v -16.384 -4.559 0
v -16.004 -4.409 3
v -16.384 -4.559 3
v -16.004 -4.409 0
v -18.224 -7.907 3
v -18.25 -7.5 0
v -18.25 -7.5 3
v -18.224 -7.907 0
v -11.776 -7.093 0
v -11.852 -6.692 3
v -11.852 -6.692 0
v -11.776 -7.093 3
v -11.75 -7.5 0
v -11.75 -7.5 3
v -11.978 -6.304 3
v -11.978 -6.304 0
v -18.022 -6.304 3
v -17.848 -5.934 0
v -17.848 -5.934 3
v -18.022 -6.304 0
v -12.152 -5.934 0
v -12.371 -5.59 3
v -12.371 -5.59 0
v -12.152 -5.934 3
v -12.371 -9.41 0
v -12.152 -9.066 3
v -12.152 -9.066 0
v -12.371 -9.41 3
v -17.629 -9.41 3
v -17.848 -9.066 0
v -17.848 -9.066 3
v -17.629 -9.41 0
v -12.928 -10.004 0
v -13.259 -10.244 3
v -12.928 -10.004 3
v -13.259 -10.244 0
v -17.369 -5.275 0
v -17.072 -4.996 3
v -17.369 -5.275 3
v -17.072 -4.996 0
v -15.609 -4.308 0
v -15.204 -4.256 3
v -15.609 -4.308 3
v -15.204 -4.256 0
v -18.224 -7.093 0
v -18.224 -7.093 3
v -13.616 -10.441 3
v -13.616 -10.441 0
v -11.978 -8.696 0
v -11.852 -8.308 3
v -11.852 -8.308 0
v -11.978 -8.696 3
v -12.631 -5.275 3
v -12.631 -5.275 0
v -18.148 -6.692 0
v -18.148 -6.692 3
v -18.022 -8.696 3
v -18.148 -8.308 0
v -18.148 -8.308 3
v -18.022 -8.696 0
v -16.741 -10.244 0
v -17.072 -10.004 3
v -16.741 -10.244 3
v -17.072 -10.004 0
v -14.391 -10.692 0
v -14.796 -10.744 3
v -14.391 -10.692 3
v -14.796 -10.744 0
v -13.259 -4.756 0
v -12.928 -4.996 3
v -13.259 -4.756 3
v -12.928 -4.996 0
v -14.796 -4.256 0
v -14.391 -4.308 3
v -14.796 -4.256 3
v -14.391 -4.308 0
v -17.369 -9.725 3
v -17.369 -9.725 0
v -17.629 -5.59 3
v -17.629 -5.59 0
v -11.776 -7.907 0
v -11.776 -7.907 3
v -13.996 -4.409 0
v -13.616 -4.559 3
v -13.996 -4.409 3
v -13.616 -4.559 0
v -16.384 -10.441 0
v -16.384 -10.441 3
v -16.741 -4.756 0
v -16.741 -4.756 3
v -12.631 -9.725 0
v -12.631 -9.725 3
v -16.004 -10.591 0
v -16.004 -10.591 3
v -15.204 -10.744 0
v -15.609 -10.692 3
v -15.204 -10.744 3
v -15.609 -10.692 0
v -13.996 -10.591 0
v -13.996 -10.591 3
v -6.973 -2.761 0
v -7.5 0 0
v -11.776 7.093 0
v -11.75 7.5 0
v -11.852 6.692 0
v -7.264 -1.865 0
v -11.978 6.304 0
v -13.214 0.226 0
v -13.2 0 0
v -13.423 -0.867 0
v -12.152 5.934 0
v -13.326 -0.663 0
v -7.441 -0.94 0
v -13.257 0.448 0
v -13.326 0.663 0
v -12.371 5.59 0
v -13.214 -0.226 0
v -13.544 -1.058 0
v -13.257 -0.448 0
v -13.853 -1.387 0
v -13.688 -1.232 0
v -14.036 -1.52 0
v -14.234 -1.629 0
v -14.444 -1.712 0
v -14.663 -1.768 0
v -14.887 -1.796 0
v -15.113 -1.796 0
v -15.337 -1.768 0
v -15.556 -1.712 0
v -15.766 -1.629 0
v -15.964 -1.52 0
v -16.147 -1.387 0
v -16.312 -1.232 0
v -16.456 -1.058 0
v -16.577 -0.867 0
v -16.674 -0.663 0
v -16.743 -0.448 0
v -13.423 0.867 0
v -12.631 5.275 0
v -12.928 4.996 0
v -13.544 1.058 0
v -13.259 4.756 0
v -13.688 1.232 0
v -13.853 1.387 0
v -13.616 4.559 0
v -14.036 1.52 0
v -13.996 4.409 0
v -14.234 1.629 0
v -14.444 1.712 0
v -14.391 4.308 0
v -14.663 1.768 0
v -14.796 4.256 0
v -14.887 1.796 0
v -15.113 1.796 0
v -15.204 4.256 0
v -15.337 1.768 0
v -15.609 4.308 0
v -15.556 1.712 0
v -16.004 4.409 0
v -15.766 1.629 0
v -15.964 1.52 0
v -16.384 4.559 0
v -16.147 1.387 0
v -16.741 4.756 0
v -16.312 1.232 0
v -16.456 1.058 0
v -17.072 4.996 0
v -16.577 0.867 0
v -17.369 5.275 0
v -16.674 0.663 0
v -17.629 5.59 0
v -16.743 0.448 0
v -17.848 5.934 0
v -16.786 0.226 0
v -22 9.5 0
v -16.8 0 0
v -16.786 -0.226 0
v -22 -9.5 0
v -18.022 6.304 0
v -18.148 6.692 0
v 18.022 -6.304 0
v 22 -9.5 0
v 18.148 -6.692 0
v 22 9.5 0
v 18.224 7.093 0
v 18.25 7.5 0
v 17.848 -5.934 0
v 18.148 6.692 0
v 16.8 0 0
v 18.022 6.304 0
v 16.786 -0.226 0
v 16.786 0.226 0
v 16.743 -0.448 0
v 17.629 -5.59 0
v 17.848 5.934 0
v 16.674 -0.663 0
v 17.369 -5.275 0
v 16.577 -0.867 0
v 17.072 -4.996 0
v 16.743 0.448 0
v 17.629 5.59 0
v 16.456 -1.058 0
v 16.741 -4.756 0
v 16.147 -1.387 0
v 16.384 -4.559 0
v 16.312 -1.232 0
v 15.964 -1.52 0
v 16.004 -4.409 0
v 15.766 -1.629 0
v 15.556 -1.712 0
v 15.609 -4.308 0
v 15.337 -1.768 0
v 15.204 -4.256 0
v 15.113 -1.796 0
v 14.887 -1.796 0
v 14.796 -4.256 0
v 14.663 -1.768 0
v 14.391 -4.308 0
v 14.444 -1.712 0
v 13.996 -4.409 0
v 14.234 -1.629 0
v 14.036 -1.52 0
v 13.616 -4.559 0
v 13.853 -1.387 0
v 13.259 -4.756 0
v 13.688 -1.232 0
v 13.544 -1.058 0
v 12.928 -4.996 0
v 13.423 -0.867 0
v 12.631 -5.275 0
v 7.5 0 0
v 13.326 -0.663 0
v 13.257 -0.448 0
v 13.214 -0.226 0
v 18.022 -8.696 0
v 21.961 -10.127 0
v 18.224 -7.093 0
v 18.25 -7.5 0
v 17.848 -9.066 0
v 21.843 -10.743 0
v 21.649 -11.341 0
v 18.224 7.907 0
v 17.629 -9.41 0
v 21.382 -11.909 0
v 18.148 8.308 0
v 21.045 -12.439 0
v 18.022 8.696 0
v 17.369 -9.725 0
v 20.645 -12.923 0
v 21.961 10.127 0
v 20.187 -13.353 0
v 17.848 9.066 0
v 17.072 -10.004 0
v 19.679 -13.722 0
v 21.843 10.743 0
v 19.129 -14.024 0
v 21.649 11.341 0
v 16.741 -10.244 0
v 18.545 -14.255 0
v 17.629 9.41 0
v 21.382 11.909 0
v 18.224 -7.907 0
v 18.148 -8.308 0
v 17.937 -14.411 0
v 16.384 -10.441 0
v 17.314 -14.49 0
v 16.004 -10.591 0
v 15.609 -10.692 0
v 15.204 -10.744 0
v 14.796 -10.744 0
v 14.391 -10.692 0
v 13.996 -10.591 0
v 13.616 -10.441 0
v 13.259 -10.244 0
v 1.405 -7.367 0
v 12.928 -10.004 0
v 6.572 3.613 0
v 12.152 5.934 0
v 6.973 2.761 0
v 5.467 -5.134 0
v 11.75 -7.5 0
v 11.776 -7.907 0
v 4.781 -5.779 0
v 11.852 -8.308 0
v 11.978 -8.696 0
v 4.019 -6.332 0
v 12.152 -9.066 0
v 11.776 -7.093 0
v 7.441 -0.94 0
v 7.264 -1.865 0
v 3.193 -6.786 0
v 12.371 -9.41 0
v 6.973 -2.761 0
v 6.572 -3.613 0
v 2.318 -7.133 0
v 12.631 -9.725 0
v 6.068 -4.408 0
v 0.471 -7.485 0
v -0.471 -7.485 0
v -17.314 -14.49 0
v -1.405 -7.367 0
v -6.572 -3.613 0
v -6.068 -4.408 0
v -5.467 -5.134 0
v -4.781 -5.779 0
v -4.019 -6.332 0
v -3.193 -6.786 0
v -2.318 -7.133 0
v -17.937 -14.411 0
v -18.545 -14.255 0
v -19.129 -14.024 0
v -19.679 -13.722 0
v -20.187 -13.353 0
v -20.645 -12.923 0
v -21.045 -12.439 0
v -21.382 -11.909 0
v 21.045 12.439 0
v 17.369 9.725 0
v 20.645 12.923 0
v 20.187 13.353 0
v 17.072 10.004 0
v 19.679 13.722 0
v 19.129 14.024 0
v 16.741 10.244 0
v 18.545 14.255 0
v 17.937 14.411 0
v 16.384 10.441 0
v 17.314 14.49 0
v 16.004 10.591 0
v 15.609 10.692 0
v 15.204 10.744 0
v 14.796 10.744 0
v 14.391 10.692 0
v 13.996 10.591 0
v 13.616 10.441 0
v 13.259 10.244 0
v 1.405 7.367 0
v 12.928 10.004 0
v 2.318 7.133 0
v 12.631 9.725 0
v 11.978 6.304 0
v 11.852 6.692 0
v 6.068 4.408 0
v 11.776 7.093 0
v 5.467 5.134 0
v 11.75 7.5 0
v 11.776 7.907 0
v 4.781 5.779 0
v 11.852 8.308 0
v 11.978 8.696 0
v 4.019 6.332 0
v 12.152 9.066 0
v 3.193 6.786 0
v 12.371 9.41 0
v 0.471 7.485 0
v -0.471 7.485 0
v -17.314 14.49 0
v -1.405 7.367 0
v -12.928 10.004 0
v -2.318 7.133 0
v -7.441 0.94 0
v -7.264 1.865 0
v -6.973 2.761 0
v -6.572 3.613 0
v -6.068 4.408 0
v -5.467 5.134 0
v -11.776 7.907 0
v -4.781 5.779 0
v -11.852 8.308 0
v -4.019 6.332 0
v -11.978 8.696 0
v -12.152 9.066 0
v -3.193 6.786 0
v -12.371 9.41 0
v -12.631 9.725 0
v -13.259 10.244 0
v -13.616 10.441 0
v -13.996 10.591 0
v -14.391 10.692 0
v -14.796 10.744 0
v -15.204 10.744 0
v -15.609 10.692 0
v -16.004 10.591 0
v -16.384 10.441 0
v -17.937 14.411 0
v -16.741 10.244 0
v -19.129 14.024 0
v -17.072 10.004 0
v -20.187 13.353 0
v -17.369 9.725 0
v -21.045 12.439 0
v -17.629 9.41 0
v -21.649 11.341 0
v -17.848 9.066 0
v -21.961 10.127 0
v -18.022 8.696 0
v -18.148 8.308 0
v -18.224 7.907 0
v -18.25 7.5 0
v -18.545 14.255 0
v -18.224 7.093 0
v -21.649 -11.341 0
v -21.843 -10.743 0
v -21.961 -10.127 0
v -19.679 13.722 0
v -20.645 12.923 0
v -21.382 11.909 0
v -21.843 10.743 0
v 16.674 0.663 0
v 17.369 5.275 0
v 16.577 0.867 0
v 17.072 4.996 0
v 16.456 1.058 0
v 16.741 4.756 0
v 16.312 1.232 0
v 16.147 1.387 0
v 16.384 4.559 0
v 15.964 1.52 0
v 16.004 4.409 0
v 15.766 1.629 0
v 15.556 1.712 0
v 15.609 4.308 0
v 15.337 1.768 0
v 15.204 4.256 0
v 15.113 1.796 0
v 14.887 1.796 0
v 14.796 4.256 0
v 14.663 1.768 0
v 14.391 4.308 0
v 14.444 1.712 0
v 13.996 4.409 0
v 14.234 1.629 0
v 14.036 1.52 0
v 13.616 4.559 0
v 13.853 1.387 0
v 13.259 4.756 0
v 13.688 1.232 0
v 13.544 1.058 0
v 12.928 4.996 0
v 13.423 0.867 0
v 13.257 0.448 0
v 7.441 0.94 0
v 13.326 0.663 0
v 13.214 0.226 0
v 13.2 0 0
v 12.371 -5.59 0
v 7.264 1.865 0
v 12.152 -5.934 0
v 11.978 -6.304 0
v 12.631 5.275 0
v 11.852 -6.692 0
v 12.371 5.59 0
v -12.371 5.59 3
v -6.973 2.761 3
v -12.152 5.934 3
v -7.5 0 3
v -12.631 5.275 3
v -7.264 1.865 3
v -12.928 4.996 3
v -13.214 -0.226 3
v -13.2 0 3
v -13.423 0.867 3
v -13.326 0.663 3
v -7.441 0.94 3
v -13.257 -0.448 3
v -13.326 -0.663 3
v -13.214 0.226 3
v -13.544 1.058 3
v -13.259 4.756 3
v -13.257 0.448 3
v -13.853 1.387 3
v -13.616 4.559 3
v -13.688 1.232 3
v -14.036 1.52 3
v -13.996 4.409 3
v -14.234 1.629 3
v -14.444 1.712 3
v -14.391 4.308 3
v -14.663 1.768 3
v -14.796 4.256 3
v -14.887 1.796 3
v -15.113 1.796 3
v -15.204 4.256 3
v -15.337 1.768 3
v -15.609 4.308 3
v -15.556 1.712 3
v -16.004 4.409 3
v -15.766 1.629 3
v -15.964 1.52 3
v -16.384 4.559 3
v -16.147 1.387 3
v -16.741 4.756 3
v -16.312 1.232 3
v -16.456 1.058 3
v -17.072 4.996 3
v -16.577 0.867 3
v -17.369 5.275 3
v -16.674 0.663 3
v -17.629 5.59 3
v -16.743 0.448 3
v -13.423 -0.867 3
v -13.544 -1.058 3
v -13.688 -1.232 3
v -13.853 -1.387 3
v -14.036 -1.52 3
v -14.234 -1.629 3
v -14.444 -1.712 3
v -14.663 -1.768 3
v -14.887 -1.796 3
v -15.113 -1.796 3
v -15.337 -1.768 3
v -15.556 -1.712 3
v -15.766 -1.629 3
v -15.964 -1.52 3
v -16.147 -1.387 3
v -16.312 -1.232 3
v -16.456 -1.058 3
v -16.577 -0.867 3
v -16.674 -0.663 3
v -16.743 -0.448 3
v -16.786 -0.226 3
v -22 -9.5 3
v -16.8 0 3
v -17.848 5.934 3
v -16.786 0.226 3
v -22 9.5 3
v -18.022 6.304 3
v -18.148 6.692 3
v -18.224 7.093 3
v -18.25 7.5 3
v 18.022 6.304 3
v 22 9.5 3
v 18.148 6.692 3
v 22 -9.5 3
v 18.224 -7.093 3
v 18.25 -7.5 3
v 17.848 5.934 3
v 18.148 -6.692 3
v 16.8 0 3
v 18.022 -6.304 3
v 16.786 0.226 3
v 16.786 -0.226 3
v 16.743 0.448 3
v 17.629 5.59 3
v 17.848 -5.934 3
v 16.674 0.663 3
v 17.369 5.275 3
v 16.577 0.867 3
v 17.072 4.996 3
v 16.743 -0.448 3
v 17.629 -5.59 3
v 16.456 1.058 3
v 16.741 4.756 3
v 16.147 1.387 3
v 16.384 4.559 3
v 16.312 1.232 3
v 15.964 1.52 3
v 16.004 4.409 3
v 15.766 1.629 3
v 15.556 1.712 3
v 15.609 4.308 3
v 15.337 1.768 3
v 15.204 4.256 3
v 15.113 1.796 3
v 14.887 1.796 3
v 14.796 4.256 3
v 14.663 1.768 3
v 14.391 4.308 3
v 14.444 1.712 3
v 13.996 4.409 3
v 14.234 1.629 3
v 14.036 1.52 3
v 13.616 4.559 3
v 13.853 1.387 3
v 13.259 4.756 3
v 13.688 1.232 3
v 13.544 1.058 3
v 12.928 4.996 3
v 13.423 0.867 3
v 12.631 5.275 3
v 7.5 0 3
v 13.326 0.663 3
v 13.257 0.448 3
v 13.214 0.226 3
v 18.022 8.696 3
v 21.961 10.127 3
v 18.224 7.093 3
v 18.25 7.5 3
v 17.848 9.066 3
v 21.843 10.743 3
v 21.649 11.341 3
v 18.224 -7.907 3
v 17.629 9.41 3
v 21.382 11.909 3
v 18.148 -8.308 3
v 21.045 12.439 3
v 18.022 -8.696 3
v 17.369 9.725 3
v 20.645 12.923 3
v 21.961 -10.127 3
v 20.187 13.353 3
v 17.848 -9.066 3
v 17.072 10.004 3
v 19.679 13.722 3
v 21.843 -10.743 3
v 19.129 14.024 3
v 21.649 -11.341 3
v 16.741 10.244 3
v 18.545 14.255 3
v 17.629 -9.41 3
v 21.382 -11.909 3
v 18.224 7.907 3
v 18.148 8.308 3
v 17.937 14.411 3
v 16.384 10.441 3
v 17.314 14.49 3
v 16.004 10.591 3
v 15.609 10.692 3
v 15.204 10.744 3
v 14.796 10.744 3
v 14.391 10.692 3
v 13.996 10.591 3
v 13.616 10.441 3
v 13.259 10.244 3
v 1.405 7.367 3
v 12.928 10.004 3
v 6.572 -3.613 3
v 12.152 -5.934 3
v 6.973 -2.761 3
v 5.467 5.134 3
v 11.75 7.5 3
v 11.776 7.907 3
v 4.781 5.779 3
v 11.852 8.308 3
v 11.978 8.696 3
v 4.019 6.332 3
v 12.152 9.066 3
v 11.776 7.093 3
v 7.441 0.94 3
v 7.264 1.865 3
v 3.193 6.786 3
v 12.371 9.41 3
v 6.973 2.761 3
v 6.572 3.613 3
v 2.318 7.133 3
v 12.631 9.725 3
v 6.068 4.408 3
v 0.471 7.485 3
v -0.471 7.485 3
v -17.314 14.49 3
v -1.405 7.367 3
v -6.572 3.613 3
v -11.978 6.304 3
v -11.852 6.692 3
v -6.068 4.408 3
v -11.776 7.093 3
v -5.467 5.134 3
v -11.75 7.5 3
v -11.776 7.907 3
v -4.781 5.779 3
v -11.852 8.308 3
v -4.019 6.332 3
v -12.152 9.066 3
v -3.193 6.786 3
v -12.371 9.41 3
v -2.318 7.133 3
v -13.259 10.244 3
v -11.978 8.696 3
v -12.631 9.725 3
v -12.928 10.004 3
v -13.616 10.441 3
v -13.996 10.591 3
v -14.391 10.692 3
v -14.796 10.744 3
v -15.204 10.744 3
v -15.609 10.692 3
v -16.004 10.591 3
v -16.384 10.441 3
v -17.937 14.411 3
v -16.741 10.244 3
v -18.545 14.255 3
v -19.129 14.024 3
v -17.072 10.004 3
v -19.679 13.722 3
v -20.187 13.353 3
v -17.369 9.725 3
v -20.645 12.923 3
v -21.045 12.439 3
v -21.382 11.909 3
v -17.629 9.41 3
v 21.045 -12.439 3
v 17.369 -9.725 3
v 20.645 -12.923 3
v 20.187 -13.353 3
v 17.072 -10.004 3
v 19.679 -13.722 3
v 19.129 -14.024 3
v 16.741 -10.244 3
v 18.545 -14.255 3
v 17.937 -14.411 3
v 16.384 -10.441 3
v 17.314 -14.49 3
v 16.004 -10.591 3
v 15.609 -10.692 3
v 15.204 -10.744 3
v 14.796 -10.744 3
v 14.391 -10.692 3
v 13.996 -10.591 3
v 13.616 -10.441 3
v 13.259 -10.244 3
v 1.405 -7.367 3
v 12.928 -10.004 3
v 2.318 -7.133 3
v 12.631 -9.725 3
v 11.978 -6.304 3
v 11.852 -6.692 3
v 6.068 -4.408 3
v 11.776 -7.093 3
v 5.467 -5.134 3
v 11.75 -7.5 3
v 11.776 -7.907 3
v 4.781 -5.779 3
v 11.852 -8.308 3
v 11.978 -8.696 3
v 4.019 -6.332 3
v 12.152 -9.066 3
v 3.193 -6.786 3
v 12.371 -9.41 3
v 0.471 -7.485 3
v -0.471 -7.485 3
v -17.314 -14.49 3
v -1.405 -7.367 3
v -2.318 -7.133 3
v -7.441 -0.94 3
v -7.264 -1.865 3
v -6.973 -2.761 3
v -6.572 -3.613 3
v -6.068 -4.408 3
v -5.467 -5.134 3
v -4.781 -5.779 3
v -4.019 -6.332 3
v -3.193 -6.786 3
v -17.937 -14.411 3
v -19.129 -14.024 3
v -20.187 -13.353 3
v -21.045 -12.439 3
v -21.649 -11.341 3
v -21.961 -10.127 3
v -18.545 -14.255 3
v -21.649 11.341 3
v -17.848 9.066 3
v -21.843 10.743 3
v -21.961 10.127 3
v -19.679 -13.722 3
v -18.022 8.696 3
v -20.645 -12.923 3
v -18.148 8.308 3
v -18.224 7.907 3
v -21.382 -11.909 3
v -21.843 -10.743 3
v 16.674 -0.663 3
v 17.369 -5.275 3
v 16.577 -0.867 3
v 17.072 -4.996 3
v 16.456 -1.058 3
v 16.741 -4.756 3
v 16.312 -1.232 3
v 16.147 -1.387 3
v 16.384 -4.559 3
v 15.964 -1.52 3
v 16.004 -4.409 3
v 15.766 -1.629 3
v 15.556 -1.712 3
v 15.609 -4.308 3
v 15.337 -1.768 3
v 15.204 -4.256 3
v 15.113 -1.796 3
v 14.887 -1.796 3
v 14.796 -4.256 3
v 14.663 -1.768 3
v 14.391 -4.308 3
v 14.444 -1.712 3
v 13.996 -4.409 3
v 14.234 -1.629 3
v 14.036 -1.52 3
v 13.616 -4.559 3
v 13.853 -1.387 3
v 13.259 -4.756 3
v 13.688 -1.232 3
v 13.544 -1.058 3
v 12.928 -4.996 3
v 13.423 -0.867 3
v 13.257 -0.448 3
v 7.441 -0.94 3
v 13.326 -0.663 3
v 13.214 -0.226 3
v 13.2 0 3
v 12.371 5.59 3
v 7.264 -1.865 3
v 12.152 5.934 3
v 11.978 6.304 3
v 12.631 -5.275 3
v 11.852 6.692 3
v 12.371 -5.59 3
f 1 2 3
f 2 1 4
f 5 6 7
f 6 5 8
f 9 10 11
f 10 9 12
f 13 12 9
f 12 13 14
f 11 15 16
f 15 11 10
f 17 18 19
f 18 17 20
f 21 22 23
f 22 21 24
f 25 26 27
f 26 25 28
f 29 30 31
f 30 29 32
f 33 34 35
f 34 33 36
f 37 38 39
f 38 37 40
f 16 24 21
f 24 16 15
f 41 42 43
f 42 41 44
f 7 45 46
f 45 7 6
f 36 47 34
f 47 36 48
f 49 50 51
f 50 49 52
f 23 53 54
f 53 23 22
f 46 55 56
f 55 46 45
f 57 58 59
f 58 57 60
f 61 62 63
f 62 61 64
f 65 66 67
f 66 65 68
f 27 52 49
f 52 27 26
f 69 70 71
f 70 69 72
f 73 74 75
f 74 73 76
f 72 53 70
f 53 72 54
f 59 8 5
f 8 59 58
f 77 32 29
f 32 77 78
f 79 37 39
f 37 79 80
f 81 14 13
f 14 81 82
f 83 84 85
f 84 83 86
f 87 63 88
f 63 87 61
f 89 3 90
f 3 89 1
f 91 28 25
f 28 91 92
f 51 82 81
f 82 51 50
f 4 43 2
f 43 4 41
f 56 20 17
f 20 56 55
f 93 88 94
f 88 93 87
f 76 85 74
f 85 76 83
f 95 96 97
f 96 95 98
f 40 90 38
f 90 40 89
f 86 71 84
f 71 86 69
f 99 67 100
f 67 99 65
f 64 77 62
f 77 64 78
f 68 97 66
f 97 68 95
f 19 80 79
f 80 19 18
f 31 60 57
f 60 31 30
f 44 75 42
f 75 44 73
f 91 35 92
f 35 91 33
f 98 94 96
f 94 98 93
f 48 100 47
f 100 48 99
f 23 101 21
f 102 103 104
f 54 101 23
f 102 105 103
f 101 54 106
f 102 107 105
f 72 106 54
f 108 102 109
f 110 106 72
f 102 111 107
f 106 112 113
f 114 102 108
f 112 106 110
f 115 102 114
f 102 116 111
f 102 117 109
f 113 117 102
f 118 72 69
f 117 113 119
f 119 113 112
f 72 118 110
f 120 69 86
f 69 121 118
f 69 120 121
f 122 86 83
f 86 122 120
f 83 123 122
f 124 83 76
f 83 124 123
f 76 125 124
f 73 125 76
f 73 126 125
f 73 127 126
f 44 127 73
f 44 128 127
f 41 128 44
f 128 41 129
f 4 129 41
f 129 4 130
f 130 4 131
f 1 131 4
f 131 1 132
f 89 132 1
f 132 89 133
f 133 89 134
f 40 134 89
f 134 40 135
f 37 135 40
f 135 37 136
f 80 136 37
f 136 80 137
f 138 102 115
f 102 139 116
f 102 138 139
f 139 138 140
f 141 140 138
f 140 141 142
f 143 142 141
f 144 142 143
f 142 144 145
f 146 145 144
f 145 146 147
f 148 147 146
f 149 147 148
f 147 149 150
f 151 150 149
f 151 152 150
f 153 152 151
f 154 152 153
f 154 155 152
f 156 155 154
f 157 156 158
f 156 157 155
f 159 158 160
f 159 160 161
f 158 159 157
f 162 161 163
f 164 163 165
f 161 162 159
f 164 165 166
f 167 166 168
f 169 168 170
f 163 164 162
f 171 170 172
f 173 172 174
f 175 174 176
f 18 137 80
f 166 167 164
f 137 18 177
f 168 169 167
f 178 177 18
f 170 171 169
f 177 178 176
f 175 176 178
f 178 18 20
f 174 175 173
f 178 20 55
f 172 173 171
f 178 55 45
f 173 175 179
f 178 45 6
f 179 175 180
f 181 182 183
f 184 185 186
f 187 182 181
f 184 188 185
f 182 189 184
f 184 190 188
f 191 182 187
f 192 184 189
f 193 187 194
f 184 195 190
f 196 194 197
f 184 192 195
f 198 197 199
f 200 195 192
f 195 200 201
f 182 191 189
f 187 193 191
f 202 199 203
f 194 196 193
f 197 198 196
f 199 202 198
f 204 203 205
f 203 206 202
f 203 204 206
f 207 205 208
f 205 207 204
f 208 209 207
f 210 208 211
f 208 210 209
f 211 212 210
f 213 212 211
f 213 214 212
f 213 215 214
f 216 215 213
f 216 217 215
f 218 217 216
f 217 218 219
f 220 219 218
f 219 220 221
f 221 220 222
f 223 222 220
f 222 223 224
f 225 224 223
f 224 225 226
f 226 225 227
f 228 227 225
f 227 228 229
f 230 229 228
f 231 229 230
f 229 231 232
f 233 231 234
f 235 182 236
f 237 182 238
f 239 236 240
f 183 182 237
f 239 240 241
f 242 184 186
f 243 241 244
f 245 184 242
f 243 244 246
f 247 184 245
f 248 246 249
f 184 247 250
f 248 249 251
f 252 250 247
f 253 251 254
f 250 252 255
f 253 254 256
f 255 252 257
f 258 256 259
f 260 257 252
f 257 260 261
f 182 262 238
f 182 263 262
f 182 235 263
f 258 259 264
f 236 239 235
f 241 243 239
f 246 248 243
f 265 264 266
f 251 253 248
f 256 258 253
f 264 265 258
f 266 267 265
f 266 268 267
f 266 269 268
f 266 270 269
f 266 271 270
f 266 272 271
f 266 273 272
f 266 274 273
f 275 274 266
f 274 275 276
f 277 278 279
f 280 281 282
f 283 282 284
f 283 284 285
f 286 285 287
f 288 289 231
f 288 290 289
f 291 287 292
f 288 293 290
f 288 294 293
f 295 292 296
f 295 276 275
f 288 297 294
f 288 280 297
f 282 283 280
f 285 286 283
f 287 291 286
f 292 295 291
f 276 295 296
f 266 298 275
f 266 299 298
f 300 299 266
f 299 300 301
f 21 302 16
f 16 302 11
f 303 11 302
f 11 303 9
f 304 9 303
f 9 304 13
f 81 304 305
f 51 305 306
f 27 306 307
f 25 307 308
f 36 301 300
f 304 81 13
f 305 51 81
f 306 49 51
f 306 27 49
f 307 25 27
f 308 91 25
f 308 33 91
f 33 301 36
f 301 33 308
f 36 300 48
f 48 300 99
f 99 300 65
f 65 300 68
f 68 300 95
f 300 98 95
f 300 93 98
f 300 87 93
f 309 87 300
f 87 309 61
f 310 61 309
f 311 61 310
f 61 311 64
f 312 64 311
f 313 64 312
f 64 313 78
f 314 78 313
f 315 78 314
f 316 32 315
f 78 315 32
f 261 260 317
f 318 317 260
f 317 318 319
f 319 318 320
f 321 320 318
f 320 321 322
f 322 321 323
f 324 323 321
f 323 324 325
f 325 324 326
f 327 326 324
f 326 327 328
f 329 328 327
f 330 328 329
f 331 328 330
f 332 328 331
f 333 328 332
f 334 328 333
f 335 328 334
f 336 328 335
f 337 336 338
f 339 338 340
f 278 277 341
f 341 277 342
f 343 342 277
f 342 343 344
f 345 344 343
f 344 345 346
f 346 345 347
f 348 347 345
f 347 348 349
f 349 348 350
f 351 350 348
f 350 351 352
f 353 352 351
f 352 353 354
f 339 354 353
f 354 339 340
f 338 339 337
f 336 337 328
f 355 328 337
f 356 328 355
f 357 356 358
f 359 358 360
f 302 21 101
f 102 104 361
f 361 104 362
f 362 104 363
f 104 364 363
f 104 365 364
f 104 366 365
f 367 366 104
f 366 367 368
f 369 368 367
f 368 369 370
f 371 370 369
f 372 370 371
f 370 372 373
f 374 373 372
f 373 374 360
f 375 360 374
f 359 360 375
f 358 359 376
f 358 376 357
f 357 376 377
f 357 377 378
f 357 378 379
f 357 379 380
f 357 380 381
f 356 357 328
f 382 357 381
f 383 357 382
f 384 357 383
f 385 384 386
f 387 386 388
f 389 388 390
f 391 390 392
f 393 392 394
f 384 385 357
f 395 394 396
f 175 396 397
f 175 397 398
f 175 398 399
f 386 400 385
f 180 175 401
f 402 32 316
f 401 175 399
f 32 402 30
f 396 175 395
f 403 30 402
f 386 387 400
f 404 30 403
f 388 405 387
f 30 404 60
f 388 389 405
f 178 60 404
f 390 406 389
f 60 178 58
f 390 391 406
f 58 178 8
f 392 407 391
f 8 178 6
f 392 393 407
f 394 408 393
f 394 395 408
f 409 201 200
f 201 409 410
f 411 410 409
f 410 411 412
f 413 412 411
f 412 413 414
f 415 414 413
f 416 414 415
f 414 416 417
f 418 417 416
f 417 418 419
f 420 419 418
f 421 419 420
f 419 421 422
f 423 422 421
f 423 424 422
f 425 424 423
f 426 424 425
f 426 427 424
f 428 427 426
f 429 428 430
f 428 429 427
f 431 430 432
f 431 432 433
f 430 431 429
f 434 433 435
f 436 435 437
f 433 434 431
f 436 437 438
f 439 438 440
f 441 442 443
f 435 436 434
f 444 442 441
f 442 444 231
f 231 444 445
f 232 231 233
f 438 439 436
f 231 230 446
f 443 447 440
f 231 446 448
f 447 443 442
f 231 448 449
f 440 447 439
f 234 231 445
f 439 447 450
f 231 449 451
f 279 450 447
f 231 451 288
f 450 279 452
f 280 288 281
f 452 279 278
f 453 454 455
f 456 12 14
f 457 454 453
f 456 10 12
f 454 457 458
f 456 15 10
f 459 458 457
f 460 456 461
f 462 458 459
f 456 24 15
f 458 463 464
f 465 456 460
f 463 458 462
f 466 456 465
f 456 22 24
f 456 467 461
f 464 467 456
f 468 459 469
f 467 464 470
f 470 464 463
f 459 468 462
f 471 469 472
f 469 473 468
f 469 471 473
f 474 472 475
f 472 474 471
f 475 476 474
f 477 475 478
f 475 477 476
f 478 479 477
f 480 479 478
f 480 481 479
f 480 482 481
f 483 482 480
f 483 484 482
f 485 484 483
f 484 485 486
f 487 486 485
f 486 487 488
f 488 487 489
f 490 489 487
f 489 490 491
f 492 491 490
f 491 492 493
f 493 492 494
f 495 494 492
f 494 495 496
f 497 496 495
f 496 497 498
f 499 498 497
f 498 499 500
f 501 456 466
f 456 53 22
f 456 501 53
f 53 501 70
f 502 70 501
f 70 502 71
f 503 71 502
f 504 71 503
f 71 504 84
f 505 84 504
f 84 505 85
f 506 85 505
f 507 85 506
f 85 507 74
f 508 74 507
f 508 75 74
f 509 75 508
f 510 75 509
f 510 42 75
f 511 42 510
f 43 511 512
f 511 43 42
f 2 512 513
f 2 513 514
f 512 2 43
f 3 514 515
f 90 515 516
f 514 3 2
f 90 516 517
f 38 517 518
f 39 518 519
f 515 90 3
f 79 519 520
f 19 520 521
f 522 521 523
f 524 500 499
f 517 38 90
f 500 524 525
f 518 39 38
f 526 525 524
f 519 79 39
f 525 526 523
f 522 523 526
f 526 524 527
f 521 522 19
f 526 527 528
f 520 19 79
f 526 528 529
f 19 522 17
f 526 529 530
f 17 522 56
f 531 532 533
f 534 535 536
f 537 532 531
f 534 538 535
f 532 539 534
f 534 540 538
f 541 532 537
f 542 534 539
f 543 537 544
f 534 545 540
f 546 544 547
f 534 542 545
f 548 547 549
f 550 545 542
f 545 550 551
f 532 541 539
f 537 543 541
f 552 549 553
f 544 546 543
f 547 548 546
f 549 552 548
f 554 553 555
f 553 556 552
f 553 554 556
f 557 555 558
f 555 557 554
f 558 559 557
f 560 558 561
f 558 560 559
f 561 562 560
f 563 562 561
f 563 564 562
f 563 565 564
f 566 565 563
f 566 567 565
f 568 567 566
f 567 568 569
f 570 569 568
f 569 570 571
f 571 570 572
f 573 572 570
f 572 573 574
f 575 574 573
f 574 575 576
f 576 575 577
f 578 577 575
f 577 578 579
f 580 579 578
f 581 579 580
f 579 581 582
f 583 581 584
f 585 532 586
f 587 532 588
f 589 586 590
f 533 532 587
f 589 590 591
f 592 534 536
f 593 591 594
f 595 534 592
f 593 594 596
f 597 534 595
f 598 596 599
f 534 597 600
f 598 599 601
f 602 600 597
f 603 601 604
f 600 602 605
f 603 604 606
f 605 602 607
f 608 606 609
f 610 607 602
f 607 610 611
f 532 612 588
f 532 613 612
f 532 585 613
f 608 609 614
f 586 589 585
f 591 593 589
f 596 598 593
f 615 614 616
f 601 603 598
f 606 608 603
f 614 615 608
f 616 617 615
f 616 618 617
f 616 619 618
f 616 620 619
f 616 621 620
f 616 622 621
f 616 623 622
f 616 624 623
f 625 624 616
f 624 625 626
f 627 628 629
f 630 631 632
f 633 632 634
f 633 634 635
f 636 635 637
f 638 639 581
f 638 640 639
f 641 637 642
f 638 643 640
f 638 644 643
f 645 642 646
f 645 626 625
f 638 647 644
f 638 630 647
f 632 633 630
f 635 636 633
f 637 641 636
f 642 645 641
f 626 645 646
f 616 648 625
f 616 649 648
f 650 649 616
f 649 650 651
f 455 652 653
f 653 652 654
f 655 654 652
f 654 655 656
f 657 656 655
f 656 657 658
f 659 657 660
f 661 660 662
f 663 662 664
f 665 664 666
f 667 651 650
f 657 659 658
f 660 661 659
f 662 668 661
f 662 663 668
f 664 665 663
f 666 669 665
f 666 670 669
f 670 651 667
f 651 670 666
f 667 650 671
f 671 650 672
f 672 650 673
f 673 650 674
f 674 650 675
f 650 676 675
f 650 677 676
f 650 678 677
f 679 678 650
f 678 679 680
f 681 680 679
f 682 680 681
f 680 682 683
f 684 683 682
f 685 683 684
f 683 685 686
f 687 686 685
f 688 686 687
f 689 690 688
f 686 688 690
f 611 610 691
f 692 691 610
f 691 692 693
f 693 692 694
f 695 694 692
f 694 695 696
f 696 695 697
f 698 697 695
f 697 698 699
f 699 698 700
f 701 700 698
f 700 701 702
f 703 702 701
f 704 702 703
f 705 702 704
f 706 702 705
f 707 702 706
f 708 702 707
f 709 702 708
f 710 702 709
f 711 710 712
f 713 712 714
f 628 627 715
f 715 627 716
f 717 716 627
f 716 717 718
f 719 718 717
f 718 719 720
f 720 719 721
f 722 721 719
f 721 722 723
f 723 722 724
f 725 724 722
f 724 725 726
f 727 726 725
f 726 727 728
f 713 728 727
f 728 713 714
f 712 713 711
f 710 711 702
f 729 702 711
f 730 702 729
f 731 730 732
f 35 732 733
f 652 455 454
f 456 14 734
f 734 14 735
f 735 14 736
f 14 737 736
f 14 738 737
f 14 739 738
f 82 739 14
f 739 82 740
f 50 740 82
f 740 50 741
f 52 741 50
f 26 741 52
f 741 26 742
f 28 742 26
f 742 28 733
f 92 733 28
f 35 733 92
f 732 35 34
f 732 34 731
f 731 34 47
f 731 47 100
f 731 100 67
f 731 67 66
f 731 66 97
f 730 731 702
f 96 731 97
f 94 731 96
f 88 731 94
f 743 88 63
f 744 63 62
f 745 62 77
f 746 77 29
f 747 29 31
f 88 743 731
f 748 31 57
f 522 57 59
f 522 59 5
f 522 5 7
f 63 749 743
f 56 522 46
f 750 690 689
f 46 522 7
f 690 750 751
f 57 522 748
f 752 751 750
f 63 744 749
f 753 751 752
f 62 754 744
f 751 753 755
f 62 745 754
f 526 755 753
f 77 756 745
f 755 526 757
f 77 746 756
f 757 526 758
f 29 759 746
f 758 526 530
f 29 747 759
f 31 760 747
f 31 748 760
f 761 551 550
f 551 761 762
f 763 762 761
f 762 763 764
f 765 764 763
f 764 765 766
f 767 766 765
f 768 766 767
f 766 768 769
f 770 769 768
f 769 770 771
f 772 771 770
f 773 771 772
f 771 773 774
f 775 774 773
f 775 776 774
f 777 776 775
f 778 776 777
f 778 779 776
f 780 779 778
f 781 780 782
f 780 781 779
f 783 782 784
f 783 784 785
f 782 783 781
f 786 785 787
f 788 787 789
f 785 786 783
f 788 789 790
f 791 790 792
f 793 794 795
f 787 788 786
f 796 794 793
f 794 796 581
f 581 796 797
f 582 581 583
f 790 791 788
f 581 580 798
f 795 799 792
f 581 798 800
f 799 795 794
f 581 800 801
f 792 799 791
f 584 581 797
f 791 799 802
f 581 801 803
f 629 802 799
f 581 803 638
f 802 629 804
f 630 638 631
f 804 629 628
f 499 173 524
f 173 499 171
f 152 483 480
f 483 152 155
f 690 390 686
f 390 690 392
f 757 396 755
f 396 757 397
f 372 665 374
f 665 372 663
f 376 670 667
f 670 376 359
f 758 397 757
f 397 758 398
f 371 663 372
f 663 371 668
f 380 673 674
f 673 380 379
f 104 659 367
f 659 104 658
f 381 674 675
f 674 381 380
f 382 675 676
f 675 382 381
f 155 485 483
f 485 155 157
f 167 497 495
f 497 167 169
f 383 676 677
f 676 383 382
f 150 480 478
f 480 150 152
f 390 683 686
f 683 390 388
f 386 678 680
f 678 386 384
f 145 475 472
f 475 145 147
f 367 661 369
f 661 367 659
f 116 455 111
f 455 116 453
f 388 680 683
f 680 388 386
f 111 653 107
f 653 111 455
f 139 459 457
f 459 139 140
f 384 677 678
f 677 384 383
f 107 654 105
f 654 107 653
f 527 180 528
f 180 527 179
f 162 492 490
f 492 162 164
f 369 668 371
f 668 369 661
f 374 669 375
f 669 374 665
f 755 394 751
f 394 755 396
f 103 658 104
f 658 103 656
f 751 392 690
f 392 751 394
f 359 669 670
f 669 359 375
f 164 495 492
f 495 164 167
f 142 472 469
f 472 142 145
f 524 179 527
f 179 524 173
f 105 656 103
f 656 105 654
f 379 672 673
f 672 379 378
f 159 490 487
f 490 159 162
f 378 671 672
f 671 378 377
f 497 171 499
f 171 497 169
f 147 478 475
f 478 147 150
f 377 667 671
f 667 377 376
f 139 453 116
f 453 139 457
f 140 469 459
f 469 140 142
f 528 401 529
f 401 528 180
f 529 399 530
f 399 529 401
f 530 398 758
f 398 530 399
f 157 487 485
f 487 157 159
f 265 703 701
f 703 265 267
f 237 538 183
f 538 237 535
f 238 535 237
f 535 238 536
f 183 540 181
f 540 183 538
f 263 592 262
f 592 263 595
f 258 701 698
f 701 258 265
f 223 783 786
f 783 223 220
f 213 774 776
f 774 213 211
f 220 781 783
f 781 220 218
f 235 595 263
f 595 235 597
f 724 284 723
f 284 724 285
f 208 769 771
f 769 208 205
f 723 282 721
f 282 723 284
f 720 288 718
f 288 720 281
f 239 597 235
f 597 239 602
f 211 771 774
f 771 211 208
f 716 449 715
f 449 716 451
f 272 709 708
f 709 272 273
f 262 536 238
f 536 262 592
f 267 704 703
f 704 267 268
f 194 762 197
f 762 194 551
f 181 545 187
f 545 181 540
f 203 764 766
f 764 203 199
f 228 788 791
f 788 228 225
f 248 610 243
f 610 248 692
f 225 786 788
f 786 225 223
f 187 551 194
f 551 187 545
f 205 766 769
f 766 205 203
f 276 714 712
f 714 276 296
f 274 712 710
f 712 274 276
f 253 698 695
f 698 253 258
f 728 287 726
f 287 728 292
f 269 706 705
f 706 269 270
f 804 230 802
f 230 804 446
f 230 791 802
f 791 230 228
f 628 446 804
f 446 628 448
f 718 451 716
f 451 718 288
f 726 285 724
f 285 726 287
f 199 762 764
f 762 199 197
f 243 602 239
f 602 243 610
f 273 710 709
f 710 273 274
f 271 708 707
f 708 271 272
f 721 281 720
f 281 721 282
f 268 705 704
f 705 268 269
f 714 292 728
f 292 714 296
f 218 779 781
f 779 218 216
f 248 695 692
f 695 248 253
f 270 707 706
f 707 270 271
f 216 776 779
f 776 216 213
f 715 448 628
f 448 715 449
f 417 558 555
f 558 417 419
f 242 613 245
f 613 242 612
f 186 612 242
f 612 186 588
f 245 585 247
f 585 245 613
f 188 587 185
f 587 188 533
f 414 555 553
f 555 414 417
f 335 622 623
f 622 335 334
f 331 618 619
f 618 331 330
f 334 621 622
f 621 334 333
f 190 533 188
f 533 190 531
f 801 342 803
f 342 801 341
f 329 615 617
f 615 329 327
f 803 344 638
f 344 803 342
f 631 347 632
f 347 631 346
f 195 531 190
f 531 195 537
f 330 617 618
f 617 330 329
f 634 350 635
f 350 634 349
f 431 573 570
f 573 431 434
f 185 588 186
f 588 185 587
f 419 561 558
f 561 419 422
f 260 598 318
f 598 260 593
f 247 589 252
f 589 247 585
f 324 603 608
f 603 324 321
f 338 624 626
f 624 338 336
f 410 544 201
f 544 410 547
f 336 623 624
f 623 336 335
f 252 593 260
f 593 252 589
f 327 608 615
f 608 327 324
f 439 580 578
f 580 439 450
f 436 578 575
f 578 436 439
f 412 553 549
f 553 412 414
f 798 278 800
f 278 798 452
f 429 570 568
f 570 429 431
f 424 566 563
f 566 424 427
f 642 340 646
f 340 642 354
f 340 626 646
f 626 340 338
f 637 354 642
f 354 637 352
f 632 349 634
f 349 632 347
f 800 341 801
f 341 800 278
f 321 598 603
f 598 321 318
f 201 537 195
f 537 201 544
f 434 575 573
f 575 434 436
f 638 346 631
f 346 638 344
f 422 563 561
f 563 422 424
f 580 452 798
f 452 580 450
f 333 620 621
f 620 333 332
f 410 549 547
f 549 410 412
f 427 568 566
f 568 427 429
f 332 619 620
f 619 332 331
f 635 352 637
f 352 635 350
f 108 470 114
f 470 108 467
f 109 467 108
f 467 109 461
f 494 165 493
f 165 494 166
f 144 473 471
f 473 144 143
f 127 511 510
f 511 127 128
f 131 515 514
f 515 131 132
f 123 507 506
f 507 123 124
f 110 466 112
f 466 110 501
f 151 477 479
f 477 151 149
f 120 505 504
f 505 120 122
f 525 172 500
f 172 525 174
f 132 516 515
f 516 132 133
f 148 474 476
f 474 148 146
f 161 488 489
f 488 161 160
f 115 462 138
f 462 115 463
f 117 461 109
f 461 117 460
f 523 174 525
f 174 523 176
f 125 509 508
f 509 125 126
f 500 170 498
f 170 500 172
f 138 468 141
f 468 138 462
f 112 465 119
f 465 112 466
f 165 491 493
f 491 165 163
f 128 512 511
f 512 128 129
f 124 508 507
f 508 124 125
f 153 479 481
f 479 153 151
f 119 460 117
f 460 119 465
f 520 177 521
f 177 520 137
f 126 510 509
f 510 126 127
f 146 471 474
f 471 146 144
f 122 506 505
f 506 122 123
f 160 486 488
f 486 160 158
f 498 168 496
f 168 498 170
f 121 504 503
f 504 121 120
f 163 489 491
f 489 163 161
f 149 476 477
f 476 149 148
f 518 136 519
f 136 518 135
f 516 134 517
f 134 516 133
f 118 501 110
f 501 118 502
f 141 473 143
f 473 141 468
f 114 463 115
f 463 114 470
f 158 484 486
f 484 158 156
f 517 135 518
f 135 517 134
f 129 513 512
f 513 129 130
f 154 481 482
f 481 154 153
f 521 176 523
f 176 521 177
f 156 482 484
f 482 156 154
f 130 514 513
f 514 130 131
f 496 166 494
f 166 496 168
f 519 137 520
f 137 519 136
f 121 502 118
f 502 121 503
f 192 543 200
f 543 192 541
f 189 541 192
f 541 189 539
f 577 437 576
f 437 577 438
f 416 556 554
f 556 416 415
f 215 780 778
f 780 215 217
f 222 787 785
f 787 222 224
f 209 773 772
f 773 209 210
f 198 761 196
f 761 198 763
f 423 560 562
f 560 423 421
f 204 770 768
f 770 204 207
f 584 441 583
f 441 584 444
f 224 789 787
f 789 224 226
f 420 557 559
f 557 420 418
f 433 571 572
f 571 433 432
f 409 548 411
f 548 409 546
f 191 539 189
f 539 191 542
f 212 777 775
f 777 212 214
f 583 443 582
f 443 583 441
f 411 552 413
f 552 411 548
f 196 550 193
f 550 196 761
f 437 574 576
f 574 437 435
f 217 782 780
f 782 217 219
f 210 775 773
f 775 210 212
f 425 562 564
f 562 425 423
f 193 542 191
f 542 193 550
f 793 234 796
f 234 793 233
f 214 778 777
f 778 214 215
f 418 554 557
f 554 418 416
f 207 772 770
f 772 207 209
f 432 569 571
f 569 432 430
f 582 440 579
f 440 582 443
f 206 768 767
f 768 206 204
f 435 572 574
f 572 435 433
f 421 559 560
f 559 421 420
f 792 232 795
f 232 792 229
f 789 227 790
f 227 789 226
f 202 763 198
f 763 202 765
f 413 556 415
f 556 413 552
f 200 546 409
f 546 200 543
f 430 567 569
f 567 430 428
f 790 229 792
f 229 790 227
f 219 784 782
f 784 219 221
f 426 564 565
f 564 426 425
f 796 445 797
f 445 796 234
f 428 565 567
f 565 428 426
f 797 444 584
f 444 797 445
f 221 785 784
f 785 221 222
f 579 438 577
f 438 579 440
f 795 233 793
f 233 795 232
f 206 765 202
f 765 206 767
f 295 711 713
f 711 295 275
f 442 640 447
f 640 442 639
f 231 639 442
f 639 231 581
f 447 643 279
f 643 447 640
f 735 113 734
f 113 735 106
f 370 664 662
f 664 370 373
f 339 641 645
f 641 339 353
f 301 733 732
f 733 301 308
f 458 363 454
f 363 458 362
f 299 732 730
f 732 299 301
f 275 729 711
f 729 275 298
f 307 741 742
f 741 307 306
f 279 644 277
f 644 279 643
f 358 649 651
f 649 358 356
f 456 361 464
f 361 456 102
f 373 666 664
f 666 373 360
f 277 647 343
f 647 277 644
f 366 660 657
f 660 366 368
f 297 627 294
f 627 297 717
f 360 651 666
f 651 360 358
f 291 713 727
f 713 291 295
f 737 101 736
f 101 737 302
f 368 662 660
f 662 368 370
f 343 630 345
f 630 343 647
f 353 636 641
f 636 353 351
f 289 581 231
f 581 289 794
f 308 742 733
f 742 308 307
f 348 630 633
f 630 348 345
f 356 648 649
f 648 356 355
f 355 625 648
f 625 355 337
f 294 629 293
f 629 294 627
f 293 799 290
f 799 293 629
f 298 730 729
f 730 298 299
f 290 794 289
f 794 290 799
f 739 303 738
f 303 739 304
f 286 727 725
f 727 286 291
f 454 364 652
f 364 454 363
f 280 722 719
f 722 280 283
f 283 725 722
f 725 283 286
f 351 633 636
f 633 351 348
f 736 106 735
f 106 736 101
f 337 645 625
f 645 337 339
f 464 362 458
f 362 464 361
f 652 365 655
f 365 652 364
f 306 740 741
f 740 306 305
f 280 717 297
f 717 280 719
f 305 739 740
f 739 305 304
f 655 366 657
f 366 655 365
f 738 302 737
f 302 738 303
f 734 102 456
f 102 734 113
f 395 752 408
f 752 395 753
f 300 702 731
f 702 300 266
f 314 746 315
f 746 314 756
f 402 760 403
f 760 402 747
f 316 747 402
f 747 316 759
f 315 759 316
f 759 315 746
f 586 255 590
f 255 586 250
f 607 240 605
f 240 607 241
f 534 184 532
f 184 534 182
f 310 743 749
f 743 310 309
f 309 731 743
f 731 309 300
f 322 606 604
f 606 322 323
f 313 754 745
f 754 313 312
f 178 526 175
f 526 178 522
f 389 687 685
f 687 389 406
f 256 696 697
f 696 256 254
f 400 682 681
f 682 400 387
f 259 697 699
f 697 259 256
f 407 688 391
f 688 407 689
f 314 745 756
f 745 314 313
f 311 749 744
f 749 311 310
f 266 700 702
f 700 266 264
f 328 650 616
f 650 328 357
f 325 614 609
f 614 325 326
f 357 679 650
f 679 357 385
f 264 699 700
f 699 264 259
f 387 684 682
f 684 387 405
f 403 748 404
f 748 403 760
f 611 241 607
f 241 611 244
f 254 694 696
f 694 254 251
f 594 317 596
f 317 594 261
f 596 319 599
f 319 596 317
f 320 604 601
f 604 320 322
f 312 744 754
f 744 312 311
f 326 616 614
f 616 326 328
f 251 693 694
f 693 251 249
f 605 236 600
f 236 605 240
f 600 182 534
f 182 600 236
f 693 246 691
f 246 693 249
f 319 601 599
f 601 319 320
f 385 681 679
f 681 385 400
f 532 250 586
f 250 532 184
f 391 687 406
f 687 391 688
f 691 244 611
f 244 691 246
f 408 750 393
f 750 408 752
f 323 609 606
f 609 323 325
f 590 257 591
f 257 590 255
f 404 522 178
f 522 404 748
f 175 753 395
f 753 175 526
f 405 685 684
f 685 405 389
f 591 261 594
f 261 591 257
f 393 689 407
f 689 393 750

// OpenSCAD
$fn = 50;

difference() {
	union() {
		hull() {
			translate(v = [-17.0, 9.5, 0]) {
				cylinder(h = 3, r = 5);
			}
			translate(v = [17.0, 9.5, 0]) {
				cylinder(h = 3, r = 5);
			}
			translate(v = [-17.0, -9.5, 0]) {
				cylinder(h = 3, r = 5);
			}
			translate(v = [17.0, -9.5, 0]) {
				cylinder(h = 3, r = 5);
			}
		}
	}
	union() {
		translate(v = [-15.0, -7.5, 0]) {
			cylinder(h = 3, r = 3.25);
		}
		translate(v = [-15.0, 7.5, 0]) {
			cylinder(h = 3, r = 3.25);
		}
		translate(v = [15.0, -7.5, 0]) {
			cylinder(h = 3, r = 3.25);
		}
		translate(v = [15.0, 7.5, 0]) {
			cylinder(h = 3, r = 3.25);
		}
		translate(v = [-15.0, 0.0, 0]) {
			cylinder(h = 3, r = 1.8);
		}
		translate(v = [15.0, 0.0, 0]) {
			cylinder(h = 3, r = 1.8);
		}
		cylinder(h = 3, r = 7.5);
	}
}
